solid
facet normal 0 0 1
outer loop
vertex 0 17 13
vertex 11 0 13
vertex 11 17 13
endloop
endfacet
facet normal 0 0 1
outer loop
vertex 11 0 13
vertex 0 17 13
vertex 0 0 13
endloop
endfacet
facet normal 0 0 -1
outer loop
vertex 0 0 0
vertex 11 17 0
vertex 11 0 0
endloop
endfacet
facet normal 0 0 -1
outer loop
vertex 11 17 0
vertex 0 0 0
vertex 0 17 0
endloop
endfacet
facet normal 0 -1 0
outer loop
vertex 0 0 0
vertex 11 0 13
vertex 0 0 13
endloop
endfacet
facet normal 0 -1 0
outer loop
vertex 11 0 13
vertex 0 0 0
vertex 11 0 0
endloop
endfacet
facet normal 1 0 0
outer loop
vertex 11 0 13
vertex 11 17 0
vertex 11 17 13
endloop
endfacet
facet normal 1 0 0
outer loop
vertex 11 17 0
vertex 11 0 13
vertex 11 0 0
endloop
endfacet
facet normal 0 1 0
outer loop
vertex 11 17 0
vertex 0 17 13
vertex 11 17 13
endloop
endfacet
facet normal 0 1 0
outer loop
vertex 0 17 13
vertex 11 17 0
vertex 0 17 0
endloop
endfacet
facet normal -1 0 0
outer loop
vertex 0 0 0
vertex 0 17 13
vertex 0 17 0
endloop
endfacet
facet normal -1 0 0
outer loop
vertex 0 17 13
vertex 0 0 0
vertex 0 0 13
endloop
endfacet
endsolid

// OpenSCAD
// Generated by SolidPython 1.0.1 on 2020-07-29 00:46:55


cube(size = [11, 17, 13]);
/***********************************************
*********      SolidPython code:      **********
************************************************
 
# import packages: SolidPython
from solid import *
from solid.utils import *
from itertools import chain, combinations, permutations


class Resize:

    def __init__(self, scad_file):
        self.scad_file = scad_file
        #self.scad_file = import_scad(scad_file)
        # cone/cylinder param:
        self.r1 = 0
        self.r2 = 0
        self.h = 0
        # rectangular prism param:
        self.w = 0
        self.l = 0
        # ellipse param:
        self.r = 0

    # import OpenScad code (file name corresponds to shape)


    # classify shape + parameters
    def assign(self, param1, param2, param3):
        if self.scad_file == 'cone.scad':
            self.r1 = param1
            self.r2 = param2
            self.h = param3
        elif self.scad_file == 'cylinder.scad':
            self.r1 = param1
            self.r2 = param2
            self.h = param3
        elif self.scad_file == 'rectangularPrism.scad':
            self.h = param1
            self.l = param2
            self.w = param3
        else:
            self.r = param1
            self.h = param2

    # resize parameters
    def iterate(self):
        x = range(3, 20, 2)
        i = 1
        if self.scad_file == 'cone.scad':
            tempList = list(permutations(x, 2))
            for temp in tempList:
                param1 = temp[0]
                param2 = temp[1]
                filepath = 'produced_scad_files/' + 'cone' + str(param1) + '_' + str(param2) + '_' + '.scad'
                scad_render_to_file(cylinder(h=param1, r1=param2, r2=0), filepath)

        elif self.scad_file == 'cylinder.scad':
            tempList = list(permutations(x, 3))
            for temp in tempList:
                param1 = temp[0]
                param2 = temp[1]
                filepath = 'produced_scad_files/' + 'cylinder' + str(param1) + '_' + str(param2) + '_' + '.scad'
                scad_render_to_file(cylinder(h=param1, r1=param2, r2=param2), filepath)

        elif self.scad_file == 'rectangularPrism.scad':
            tempList = list(permutations(x, 3))
            for temp in tempList:
                param1 = temp[0]
                param2 = temp[1]
                param3 = temp[2]
                filepath = 'produced_scad_files/' + 'rectangularPrism' + str(param1) + '_' + str(param2) + '_' + str(
                    param3) + '.scad'
                scad_render_to_file(cube(size=(param1, param2, param3)), filepath)

        elif self.scad_file == 'ellipse.scad':
            tempList = list(permutations(x, 4))
            for temp in tempList:
                param1 = temp[0]
                param2 = temp[1]
                param3 = temp[2]
                param4 = temp[3]
                filepath = 'produced_scad_files/' + 'ellipse' + str(param1) + '_' + str(param2) + '_' + str(param3) + '_' + str(param4) + '.scad'
                scad_render_to_file(scale([param1, param2, param3])(sphere(r=param4)), filepath)

    def render_to_scadfile(self):
        scad_render_to_file(scad, 'example.scad') 
 
************************************************/
